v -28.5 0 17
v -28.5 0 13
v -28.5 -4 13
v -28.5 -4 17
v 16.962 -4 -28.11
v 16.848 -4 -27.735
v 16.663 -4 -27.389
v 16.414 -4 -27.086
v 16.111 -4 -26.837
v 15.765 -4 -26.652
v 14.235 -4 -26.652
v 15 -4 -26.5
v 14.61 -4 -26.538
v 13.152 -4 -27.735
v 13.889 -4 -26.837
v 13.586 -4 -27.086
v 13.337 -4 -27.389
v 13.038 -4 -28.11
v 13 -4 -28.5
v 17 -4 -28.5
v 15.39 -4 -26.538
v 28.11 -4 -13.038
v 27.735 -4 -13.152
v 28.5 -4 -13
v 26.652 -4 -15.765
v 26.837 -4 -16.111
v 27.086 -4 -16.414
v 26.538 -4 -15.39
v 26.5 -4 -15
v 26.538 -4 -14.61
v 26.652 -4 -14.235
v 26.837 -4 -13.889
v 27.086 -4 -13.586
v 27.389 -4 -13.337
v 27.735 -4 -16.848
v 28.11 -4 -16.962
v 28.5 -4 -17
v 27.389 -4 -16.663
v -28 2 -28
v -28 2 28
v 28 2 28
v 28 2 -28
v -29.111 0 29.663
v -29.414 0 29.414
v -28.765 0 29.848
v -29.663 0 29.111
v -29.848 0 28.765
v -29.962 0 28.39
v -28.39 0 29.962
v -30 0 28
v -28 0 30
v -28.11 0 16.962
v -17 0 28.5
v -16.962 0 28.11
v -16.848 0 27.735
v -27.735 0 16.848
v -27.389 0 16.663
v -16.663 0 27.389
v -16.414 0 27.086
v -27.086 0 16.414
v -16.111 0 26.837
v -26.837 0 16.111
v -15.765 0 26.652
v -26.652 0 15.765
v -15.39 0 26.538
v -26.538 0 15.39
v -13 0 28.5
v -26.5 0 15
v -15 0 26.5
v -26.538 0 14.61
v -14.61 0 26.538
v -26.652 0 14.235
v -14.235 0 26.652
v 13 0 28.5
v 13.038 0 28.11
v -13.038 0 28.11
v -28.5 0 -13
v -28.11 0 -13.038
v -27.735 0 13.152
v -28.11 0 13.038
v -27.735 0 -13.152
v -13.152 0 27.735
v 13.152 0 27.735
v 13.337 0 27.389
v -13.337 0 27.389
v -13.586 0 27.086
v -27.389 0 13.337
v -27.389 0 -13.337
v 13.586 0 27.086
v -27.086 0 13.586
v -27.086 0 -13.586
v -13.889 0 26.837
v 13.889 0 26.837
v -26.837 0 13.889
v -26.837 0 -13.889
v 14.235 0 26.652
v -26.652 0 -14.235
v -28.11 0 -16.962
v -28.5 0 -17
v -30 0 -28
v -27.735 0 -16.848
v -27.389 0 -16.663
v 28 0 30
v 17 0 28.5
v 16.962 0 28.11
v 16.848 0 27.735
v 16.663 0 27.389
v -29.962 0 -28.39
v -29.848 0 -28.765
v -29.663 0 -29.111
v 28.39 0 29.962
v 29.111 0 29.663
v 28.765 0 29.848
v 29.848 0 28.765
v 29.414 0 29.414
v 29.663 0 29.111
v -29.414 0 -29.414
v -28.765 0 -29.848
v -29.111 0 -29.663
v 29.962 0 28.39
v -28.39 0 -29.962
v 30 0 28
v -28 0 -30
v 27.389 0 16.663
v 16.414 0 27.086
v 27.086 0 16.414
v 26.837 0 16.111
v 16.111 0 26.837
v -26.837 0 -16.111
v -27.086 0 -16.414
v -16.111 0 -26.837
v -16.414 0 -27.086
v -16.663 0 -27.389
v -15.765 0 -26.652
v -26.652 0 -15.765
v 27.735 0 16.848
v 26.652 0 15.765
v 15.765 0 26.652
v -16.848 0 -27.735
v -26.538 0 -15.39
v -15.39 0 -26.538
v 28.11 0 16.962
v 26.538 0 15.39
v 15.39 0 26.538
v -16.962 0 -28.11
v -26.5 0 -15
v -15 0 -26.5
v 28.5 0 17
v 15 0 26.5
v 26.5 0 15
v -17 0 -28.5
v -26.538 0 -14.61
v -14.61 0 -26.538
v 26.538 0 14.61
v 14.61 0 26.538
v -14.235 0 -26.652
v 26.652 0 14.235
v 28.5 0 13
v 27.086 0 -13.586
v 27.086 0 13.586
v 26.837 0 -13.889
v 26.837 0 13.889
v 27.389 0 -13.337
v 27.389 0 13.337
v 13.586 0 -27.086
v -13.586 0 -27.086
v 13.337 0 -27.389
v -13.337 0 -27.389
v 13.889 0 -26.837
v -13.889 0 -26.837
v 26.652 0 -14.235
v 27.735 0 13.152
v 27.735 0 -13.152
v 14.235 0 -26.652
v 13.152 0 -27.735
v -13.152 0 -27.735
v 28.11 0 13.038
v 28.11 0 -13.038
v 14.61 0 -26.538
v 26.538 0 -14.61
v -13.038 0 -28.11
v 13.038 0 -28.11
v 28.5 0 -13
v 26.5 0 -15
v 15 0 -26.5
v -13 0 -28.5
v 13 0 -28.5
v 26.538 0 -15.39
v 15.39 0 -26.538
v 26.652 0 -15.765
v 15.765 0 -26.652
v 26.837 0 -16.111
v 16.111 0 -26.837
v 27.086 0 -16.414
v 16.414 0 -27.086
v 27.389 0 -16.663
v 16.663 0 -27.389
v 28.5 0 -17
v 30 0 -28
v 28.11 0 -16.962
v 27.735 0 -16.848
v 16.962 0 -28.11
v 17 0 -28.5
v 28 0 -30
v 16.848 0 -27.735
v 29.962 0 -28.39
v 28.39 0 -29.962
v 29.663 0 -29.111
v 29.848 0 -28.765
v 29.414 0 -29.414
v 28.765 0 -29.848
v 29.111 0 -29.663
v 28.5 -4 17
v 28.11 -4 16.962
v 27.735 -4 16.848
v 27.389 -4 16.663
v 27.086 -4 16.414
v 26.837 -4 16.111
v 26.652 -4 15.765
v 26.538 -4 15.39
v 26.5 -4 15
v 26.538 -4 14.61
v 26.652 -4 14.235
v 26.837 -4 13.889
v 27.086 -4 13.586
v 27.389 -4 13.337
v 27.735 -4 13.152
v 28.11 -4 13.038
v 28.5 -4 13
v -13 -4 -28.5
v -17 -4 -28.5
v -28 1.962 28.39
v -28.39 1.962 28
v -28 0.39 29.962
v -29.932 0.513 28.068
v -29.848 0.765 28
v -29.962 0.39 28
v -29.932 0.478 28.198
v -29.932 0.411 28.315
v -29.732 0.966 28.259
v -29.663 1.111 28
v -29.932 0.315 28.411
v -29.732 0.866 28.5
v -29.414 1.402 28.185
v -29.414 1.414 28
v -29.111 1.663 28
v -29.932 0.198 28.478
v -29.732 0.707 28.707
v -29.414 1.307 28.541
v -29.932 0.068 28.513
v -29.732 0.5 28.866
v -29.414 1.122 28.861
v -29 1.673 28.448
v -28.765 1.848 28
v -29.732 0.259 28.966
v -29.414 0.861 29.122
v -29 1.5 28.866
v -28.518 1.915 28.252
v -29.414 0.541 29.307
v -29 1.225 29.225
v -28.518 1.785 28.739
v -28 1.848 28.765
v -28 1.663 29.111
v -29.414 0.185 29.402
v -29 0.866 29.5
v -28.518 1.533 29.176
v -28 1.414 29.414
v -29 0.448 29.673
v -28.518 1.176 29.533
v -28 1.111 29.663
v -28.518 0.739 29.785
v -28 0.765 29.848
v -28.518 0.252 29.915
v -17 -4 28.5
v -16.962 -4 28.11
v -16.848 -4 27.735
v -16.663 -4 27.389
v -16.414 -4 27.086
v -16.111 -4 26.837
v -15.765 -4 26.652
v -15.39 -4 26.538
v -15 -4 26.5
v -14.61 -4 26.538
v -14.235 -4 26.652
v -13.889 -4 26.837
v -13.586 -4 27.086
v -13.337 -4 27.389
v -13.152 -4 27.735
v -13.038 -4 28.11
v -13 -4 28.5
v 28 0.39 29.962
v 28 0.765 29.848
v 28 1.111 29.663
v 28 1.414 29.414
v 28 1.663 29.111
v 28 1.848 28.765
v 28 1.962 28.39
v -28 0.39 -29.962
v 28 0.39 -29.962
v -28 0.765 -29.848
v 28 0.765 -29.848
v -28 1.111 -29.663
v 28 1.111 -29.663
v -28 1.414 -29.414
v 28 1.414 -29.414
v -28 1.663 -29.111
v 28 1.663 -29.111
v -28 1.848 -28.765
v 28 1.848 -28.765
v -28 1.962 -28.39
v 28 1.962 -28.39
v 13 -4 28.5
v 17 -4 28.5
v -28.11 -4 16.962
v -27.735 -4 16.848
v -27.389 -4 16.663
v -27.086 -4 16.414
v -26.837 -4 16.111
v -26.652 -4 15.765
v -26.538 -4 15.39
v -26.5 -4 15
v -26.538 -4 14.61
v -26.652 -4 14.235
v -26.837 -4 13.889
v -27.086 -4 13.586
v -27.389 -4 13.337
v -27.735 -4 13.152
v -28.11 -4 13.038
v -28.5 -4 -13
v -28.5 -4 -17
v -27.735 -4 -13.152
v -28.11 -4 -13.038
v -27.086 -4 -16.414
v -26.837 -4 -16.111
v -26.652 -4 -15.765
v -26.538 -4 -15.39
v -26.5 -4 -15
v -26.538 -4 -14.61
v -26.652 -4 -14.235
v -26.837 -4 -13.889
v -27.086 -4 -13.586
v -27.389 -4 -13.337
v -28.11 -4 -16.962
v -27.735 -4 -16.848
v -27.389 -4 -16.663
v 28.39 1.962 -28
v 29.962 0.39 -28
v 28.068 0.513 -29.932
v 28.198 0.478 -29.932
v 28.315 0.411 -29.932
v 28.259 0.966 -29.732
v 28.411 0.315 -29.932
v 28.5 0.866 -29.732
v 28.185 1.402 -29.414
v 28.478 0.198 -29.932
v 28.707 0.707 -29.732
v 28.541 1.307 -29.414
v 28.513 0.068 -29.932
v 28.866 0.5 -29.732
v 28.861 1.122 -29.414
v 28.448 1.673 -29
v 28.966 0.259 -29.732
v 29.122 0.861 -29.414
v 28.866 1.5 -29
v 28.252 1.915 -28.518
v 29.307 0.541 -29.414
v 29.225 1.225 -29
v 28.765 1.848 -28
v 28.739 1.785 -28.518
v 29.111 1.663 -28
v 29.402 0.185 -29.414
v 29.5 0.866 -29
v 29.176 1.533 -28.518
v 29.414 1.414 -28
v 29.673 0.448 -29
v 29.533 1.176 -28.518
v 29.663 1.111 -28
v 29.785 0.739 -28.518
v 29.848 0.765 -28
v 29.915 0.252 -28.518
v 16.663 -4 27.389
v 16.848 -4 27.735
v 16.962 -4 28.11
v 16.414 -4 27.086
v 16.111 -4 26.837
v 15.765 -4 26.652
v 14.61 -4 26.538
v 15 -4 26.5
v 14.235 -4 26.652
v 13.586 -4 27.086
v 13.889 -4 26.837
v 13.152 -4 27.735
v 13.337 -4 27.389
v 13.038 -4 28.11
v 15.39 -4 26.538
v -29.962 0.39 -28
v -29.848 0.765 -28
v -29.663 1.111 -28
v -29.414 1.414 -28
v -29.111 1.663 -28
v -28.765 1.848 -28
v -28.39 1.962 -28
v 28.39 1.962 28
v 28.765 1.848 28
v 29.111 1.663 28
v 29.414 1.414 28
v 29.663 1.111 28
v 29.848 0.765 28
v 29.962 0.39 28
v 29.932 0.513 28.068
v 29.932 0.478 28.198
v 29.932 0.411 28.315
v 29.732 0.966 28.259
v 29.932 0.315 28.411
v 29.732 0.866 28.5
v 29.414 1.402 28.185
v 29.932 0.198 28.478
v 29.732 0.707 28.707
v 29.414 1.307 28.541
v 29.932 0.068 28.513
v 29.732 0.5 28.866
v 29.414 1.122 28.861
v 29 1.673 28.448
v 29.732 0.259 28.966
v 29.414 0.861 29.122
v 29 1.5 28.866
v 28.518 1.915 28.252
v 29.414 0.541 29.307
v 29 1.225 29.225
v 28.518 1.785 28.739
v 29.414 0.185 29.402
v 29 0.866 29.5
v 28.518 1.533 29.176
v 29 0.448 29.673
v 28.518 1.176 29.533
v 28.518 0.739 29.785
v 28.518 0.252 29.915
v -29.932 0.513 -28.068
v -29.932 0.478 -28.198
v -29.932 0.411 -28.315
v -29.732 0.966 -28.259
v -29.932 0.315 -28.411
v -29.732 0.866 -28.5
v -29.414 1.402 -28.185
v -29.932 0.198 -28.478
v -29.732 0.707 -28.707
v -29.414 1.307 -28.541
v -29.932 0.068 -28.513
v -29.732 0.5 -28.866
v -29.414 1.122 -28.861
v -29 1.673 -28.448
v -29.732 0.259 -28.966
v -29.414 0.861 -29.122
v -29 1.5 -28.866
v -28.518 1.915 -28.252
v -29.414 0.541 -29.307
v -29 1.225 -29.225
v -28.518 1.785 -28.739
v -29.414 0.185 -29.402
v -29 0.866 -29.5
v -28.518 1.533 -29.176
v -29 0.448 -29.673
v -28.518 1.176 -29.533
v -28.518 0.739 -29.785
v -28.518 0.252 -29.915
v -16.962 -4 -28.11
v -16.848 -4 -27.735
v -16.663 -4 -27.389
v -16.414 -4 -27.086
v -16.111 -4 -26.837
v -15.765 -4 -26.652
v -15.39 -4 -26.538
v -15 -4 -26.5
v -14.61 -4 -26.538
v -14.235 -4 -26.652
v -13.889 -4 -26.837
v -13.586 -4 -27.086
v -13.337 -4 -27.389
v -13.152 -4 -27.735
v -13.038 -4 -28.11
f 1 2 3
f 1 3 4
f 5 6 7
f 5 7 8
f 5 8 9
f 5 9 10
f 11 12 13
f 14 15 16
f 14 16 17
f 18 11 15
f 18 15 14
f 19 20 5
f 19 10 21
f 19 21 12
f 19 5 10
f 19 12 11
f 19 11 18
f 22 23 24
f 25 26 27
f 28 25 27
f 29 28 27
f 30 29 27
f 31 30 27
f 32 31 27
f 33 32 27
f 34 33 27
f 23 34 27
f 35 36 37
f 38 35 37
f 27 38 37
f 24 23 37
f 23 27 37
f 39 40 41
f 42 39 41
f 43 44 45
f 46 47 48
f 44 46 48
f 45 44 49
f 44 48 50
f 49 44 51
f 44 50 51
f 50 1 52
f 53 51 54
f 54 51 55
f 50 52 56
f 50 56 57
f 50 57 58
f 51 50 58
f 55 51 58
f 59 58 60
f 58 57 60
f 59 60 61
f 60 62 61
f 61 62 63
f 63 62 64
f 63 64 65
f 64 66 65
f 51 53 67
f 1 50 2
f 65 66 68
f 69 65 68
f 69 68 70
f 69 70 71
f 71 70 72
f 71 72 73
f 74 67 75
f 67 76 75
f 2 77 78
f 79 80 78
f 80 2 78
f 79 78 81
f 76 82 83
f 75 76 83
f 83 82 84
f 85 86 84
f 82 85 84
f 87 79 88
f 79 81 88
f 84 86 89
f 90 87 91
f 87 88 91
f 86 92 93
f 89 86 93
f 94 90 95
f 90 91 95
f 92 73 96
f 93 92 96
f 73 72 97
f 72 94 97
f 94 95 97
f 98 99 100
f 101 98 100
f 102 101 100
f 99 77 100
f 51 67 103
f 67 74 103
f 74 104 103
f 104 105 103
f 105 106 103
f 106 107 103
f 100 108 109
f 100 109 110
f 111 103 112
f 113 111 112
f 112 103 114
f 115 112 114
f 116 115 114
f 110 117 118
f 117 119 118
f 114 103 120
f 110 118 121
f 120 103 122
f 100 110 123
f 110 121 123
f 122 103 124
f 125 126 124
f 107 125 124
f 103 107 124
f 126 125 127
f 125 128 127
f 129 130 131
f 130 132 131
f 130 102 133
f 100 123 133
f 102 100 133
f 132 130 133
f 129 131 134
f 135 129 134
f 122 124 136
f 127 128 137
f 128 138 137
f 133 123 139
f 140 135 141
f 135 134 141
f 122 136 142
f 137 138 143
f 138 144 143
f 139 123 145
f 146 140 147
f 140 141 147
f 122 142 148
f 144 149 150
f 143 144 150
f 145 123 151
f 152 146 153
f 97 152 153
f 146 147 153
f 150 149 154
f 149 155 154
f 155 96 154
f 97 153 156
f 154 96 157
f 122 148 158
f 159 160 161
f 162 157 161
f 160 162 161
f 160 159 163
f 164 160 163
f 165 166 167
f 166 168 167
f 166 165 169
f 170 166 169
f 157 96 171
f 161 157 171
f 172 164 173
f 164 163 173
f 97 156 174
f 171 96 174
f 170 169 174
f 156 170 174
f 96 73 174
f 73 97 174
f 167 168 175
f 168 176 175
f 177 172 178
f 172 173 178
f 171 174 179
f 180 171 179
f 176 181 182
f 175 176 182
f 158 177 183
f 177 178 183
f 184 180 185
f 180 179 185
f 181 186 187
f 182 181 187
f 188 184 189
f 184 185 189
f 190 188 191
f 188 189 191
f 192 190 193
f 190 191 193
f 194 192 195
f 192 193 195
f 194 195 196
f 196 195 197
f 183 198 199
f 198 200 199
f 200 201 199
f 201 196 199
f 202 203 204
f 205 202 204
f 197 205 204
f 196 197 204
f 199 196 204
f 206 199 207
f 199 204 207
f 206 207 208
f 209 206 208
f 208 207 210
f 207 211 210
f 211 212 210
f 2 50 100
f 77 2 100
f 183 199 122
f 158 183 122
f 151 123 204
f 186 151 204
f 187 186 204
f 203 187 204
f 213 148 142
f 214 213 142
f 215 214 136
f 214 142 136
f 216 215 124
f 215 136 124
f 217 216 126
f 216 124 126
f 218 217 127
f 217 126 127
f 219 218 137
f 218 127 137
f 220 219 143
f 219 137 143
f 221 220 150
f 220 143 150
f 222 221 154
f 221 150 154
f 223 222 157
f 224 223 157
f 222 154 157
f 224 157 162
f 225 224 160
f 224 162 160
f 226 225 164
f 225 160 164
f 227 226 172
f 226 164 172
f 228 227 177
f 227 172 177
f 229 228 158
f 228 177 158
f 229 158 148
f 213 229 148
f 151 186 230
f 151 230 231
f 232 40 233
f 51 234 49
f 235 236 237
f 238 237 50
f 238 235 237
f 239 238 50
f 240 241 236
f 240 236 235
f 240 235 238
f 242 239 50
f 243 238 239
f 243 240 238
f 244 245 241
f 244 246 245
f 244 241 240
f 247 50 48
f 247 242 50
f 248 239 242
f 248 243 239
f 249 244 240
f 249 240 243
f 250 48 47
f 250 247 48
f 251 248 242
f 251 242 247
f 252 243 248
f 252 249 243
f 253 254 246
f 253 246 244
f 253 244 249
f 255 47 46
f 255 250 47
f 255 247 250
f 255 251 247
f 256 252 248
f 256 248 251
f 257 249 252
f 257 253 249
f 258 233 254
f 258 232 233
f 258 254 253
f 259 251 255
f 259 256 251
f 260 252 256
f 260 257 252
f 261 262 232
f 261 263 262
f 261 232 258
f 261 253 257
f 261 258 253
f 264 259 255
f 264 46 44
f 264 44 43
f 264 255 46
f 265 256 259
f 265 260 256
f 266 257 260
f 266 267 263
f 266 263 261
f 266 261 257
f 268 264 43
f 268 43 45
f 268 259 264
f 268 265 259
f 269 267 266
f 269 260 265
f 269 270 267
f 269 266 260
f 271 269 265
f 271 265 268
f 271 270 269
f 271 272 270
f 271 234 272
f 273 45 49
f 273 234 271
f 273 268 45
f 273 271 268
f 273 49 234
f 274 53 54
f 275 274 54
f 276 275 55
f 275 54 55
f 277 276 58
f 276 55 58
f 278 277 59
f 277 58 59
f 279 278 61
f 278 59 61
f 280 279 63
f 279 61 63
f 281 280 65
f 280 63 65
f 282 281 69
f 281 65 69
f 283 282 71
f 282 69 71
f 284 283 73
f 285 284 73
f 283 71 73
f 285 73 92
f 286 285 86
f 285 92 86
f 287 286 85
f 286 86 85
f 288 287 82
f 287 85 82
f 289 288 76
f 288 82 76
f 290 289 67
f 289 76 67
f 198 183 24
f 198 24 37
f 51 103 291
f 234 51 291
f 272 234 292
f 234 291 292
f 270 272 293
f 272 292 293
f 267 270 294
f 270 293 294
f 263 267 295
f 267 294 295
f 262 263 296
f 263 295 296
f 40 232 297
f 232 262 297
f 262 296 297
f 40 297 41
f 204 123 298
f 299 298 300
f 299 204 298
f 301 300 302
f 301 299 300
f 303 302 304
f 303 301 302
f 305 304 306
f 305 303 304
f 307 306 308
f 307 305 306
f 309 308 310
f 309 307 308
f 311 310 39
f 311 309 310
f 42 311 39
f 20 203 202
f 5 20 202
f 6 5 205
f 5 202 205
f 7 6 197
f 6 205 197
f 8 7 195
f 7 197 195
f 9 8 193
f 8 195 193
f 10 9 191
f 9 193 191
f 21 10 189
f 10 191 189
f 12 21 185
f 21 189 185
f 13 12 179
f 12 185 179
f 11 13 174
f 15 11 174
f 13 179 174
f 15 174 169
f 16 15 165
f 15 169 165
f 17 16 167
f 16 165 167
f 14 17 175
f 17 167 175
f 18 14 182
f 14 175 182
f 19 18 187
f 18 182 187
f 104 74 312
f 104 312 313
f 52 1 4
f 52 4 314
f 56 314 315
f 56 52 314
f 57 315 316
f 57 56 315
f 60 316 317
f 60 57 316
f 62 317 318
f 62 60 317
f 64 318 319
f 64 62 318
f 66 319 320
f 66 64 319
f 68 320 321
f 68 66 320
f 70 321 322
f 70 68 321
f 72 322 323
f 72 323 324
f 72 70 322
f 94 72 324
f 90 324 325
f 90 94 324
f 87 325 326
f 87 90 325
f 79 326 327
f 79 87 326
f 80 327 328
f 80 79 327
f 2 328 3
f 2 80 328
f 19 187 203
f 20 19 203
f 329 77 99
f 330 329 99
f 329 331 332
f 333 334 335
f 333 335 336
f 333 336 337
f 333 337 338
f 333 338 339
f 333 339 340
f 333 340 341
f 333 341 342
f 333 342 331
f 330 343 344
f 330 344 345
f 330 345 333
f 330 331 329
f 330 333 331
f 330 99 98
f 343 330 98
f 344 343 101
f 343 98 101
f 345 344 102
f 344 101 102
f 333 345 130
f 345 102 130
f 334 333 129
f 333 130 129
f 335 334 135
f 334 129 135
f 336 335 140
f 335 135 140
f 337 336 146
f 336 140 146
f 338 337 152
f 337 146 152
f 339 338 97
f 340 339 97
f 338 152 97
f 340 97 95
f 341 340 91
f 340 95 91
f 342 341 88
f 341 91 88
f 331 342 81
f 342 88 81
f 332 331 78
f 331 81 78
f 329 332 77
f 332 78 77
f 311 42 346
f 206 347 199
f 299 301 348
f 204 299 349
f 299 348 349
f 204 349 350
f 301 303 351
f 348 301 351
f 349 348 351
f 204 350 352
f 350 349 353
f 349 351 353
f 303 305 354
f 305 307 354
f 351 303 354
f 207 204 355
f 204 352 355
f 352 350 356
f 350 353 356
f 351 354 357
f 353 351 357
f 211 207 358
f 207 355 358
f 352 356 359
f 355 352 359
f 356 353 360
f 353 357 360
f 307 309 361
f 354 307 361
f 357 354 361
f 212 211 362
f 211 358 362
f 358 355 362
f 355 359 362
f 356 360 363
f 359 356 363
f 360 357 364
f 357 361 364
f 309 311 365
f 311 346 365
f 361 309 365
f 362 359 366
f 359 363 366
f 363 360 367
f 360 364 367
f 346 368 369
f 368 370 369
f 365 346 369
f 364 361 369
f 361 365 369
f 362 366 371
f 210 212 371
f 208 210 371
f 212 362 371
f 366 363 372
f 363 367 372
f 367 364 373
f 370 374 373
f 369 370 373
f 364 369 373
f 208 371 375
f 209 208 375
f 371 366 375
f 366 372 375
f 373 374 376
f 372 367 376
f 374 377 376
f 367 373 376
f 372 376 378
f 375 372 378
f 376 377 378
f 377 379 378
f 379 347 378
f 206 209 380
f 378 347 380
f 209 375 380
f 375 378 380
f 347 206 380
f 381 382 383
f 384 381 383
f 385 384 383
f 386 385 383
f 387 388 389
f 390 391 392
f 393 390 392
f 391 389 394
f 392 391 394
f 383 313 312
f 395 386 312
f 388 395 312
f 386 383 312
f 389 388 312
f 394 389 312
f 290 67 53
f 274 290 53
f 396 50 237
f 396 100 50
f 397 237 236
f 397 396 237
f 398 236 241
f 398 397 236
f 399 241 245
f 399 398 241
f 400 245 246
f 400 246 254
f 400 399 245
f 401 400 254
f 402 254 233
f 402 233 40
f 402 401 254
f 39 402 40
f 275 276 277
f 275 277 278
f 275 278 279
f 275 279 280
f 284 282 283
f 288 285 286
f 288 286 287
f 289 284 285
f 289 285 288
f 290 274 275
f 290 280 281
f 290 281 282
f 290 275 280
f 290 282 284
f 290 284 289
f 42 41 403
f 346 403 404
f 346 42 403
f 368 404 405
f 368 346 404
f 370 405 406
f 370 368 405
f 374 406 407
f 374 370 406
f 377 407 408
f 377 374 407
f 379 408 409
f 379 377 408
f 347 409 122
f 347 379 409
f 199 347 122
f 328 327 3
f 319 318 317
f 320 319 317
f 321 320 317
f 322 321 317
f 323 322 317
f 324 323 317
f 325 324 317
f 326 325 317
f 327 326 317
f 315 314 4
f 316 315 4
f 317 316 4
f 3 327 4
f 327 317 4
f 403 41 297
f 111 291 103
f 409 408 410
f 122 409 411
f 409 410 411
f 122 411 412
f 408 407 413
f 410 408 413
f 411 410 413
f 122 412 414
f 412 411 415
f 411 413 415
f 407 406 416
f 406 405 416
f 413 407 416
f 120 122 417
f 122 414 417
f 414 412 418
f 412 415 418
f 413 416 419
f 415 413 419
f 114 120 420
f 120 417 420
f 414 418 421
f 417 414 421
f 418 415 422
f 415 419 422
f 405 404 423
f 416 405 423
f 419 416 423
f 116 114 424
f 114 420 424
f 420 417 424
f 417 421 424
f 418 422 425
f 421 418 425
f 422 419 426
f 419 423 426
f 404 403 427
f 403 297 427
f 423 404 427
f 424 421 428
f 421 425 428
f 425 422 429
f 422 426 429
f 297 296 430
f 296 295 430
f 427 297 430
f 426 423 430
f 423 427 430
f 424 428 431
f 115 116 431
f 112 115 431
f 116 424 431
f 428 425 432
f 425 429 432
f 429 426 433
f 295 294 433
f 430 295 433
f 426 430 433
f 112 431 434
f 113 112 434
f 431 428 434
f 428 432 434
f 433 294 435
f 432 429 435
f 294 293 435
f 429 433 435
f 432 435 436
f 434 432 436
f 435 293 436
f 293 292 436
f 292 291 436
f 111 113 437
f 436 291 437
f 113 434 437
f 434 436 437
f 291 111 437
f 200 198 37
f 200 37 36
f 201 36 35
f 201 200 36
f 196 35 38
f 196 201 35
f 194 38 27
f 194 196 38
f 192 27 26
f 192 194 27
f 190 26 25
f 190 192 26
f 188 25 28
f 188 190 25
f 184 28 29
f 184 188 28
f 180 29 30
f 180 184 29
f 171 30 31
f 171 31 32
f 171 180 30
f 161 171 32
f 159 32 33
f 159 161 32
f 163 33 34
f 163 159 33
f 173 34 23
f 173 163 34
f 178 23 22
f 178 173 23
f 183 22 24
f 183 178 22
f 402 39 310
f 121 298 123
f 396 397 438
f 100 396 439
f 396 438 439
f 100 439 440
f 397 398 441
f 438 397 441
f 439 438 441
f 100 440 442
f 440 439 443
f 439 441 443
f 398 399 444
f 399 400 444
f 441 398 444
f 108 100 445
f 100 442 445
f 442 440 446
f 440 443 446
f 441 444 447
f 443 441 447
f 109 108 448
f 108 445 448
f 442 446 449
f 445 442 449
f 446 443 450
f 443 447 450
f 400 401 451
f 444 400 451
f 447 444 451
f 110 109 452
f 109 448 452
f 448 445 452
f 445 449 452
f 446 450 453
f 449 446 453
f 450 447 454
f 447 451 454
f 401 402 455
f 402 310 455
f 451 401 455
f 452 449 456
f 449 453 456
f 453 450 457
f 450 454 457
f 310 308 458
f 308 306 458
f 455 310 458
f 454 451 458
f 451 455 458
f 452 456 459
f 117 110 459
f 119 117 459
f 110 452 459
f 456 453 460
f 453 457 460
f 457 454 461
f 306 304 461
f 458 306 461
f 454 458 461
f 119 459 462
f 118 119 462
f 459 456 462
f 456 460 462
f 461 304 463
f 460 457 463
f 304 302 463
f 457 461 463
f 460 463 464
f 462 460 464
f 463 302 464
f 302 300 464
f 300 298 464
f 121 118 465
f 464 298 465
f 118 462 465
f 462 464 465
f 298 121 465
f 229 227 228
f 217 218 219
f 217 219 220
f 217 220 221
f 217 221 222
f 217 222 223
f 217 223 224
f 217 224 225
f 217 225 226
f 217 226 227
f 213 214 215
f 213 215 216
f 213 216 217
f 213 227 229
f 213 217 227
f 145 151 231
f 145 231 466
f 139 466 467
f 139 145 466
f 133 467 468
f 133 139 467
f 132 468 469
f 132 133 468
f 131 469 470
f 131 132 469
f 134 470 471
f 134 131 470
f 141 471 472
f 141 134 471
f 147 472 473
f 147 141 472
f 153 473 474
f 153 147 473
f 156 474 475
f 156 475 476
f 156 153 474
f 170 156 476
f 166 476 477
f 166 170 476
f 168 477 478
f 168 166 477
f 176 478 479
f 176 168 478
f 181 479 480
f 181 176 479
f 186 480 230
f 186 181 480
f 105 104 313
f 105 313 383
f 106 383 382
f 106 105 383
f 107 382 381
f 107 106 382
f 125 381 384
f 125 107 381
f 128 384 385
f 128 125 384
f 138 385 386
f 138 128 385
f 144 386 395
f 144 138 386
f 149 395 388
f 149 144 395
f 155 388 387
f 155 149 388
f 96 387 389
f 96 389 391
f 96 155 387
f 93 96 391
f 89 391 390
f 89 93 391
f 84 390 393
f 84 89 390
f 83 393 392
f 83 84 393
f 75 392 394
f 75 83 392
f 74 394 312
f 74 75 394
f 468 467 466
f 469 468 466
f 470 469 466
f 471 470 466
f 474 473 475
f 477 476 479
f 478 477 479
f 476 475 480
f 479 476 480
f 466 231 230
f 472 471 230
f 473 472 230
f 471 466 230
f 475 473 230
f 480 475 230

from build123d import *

# Parameters (mm, degrees)
SKETCH_1_W            = 60
SKETCH_1_H            = 60
EXTRUDE_1_DEPTH       = 2
EXTRUDE_2_DEPTH       = 4
MIRROR_2_COPY_1_DEPTH = 4
EXTRUDE_3_DEPTH       = 4
MIRROR_4_COPY_1_DEPTH = 4
FILLET_1_R            = 2


with BuildPart() as part:
    # 草图1 → 凸台-拉伸1 (new body)
    with BuildSketch(Plane(origin=(0, 0, 0), x_dir=(1, 0, 0), z_dir=(0, 1, 0))):
        Rectangle(SKETCH_1_W, SKETCH_1_H)
    extrude(amount=EXTRUDE_1_DEPTH)

    # 草图2 → 凸台-拉伸2 (add)
    with BuildSketch(Plane.XZ):
        with BuildLine():
            Line((-28.5, 13), (-28.5, 17))
            ThreePointArc((-28.5, 17), (-26.5, 15), (-28.5, 13))
        make_face()
    extrude_2 = extrude(amount=EXTRUDE_2_DEPTH)

    # 镜向1: 凸台-拉伸2 across plane
    add(extrude_2.mirror(Plane.XY))

    # 镜向2: 凸台-拉伸2 across plane
    add(extrude_2.mirror(Plane(origin=(0, 0, 0), x_dir=(0, 0, 1), z_dir=(1, 0, 0))))

    # 镜向2 copy 1 sketch → 镜向2 copy 1 (add)
    with BuildSketch(Plane(origin=(0, 0, 0), x_dir=(-1, 0, 0), z_dir=(0, -1, 0))):
        with BuildLine():
            Line((-28.5, 13), (-28.5, 17))
            ThreePointArc((-28.5, 17), (-26.5, 15), (-28.5, 13))
        make_face()
    extrude(amount=MIRROR_2_COPY_1_DEPTH)

    # 草图3 → 凸台-拉伸3 (add)
    with BuildSketch(Plane.XZ):
        with BuildLine():
            Line((-13, 28.5), (-17, 28.5))
            ThreePointArc((-17, 28.5), (-15, 26.5), (-13, 28.5))
        make_face()
    extrude_3 = extrude(amount=EXTRUDE_3_DEPTH)

    # 镜向3: 凸台-拉伸3 across plane
    add(extrude_3.mirror(Plane(origin=(0, 0, 0), x_dir=(0, 0, 1), z_dir=(1, 0, 0))))

    # 镜向4: 凸台-拉伸3 across plane
    add(extrude_3.mirror(Plane.XY))

    # 镜向4 copy 1 sketch → 镜向4 copy 1 (add)
    with BuildSketch(Plane(origin=(0, 0, 0), x_dir=(-1, 0, 0), z_dir=(0, -1, 0))):
        with BuildLine():
            Line((-13, 28.5), (-17, 28.5))
            ThreePointArc((-17, 28.5), (-15, 26.5), (-13, 28.5))
        make_face()
    extrude(amount=MIRROR_4_COPY_1_DEPTH)

    # 圆角1
    fillet_1_edges = [part.edges().sort_by_distance(p)[0] for p in [
        (0, 2, 30),
        (30, 2, 0),
        (0, 2, -30),
        (-30, 2, 0),
        (30, 1, -30),
        (30, 1, 30),
        (-30, 1, 30),
        (-30, 1, -30),
    ]]
    fillet(fillet_1_edges, radius=FILLET_1_R - 0.0001)  # a hair under: the kernel refuses the full size


solid = part.part
